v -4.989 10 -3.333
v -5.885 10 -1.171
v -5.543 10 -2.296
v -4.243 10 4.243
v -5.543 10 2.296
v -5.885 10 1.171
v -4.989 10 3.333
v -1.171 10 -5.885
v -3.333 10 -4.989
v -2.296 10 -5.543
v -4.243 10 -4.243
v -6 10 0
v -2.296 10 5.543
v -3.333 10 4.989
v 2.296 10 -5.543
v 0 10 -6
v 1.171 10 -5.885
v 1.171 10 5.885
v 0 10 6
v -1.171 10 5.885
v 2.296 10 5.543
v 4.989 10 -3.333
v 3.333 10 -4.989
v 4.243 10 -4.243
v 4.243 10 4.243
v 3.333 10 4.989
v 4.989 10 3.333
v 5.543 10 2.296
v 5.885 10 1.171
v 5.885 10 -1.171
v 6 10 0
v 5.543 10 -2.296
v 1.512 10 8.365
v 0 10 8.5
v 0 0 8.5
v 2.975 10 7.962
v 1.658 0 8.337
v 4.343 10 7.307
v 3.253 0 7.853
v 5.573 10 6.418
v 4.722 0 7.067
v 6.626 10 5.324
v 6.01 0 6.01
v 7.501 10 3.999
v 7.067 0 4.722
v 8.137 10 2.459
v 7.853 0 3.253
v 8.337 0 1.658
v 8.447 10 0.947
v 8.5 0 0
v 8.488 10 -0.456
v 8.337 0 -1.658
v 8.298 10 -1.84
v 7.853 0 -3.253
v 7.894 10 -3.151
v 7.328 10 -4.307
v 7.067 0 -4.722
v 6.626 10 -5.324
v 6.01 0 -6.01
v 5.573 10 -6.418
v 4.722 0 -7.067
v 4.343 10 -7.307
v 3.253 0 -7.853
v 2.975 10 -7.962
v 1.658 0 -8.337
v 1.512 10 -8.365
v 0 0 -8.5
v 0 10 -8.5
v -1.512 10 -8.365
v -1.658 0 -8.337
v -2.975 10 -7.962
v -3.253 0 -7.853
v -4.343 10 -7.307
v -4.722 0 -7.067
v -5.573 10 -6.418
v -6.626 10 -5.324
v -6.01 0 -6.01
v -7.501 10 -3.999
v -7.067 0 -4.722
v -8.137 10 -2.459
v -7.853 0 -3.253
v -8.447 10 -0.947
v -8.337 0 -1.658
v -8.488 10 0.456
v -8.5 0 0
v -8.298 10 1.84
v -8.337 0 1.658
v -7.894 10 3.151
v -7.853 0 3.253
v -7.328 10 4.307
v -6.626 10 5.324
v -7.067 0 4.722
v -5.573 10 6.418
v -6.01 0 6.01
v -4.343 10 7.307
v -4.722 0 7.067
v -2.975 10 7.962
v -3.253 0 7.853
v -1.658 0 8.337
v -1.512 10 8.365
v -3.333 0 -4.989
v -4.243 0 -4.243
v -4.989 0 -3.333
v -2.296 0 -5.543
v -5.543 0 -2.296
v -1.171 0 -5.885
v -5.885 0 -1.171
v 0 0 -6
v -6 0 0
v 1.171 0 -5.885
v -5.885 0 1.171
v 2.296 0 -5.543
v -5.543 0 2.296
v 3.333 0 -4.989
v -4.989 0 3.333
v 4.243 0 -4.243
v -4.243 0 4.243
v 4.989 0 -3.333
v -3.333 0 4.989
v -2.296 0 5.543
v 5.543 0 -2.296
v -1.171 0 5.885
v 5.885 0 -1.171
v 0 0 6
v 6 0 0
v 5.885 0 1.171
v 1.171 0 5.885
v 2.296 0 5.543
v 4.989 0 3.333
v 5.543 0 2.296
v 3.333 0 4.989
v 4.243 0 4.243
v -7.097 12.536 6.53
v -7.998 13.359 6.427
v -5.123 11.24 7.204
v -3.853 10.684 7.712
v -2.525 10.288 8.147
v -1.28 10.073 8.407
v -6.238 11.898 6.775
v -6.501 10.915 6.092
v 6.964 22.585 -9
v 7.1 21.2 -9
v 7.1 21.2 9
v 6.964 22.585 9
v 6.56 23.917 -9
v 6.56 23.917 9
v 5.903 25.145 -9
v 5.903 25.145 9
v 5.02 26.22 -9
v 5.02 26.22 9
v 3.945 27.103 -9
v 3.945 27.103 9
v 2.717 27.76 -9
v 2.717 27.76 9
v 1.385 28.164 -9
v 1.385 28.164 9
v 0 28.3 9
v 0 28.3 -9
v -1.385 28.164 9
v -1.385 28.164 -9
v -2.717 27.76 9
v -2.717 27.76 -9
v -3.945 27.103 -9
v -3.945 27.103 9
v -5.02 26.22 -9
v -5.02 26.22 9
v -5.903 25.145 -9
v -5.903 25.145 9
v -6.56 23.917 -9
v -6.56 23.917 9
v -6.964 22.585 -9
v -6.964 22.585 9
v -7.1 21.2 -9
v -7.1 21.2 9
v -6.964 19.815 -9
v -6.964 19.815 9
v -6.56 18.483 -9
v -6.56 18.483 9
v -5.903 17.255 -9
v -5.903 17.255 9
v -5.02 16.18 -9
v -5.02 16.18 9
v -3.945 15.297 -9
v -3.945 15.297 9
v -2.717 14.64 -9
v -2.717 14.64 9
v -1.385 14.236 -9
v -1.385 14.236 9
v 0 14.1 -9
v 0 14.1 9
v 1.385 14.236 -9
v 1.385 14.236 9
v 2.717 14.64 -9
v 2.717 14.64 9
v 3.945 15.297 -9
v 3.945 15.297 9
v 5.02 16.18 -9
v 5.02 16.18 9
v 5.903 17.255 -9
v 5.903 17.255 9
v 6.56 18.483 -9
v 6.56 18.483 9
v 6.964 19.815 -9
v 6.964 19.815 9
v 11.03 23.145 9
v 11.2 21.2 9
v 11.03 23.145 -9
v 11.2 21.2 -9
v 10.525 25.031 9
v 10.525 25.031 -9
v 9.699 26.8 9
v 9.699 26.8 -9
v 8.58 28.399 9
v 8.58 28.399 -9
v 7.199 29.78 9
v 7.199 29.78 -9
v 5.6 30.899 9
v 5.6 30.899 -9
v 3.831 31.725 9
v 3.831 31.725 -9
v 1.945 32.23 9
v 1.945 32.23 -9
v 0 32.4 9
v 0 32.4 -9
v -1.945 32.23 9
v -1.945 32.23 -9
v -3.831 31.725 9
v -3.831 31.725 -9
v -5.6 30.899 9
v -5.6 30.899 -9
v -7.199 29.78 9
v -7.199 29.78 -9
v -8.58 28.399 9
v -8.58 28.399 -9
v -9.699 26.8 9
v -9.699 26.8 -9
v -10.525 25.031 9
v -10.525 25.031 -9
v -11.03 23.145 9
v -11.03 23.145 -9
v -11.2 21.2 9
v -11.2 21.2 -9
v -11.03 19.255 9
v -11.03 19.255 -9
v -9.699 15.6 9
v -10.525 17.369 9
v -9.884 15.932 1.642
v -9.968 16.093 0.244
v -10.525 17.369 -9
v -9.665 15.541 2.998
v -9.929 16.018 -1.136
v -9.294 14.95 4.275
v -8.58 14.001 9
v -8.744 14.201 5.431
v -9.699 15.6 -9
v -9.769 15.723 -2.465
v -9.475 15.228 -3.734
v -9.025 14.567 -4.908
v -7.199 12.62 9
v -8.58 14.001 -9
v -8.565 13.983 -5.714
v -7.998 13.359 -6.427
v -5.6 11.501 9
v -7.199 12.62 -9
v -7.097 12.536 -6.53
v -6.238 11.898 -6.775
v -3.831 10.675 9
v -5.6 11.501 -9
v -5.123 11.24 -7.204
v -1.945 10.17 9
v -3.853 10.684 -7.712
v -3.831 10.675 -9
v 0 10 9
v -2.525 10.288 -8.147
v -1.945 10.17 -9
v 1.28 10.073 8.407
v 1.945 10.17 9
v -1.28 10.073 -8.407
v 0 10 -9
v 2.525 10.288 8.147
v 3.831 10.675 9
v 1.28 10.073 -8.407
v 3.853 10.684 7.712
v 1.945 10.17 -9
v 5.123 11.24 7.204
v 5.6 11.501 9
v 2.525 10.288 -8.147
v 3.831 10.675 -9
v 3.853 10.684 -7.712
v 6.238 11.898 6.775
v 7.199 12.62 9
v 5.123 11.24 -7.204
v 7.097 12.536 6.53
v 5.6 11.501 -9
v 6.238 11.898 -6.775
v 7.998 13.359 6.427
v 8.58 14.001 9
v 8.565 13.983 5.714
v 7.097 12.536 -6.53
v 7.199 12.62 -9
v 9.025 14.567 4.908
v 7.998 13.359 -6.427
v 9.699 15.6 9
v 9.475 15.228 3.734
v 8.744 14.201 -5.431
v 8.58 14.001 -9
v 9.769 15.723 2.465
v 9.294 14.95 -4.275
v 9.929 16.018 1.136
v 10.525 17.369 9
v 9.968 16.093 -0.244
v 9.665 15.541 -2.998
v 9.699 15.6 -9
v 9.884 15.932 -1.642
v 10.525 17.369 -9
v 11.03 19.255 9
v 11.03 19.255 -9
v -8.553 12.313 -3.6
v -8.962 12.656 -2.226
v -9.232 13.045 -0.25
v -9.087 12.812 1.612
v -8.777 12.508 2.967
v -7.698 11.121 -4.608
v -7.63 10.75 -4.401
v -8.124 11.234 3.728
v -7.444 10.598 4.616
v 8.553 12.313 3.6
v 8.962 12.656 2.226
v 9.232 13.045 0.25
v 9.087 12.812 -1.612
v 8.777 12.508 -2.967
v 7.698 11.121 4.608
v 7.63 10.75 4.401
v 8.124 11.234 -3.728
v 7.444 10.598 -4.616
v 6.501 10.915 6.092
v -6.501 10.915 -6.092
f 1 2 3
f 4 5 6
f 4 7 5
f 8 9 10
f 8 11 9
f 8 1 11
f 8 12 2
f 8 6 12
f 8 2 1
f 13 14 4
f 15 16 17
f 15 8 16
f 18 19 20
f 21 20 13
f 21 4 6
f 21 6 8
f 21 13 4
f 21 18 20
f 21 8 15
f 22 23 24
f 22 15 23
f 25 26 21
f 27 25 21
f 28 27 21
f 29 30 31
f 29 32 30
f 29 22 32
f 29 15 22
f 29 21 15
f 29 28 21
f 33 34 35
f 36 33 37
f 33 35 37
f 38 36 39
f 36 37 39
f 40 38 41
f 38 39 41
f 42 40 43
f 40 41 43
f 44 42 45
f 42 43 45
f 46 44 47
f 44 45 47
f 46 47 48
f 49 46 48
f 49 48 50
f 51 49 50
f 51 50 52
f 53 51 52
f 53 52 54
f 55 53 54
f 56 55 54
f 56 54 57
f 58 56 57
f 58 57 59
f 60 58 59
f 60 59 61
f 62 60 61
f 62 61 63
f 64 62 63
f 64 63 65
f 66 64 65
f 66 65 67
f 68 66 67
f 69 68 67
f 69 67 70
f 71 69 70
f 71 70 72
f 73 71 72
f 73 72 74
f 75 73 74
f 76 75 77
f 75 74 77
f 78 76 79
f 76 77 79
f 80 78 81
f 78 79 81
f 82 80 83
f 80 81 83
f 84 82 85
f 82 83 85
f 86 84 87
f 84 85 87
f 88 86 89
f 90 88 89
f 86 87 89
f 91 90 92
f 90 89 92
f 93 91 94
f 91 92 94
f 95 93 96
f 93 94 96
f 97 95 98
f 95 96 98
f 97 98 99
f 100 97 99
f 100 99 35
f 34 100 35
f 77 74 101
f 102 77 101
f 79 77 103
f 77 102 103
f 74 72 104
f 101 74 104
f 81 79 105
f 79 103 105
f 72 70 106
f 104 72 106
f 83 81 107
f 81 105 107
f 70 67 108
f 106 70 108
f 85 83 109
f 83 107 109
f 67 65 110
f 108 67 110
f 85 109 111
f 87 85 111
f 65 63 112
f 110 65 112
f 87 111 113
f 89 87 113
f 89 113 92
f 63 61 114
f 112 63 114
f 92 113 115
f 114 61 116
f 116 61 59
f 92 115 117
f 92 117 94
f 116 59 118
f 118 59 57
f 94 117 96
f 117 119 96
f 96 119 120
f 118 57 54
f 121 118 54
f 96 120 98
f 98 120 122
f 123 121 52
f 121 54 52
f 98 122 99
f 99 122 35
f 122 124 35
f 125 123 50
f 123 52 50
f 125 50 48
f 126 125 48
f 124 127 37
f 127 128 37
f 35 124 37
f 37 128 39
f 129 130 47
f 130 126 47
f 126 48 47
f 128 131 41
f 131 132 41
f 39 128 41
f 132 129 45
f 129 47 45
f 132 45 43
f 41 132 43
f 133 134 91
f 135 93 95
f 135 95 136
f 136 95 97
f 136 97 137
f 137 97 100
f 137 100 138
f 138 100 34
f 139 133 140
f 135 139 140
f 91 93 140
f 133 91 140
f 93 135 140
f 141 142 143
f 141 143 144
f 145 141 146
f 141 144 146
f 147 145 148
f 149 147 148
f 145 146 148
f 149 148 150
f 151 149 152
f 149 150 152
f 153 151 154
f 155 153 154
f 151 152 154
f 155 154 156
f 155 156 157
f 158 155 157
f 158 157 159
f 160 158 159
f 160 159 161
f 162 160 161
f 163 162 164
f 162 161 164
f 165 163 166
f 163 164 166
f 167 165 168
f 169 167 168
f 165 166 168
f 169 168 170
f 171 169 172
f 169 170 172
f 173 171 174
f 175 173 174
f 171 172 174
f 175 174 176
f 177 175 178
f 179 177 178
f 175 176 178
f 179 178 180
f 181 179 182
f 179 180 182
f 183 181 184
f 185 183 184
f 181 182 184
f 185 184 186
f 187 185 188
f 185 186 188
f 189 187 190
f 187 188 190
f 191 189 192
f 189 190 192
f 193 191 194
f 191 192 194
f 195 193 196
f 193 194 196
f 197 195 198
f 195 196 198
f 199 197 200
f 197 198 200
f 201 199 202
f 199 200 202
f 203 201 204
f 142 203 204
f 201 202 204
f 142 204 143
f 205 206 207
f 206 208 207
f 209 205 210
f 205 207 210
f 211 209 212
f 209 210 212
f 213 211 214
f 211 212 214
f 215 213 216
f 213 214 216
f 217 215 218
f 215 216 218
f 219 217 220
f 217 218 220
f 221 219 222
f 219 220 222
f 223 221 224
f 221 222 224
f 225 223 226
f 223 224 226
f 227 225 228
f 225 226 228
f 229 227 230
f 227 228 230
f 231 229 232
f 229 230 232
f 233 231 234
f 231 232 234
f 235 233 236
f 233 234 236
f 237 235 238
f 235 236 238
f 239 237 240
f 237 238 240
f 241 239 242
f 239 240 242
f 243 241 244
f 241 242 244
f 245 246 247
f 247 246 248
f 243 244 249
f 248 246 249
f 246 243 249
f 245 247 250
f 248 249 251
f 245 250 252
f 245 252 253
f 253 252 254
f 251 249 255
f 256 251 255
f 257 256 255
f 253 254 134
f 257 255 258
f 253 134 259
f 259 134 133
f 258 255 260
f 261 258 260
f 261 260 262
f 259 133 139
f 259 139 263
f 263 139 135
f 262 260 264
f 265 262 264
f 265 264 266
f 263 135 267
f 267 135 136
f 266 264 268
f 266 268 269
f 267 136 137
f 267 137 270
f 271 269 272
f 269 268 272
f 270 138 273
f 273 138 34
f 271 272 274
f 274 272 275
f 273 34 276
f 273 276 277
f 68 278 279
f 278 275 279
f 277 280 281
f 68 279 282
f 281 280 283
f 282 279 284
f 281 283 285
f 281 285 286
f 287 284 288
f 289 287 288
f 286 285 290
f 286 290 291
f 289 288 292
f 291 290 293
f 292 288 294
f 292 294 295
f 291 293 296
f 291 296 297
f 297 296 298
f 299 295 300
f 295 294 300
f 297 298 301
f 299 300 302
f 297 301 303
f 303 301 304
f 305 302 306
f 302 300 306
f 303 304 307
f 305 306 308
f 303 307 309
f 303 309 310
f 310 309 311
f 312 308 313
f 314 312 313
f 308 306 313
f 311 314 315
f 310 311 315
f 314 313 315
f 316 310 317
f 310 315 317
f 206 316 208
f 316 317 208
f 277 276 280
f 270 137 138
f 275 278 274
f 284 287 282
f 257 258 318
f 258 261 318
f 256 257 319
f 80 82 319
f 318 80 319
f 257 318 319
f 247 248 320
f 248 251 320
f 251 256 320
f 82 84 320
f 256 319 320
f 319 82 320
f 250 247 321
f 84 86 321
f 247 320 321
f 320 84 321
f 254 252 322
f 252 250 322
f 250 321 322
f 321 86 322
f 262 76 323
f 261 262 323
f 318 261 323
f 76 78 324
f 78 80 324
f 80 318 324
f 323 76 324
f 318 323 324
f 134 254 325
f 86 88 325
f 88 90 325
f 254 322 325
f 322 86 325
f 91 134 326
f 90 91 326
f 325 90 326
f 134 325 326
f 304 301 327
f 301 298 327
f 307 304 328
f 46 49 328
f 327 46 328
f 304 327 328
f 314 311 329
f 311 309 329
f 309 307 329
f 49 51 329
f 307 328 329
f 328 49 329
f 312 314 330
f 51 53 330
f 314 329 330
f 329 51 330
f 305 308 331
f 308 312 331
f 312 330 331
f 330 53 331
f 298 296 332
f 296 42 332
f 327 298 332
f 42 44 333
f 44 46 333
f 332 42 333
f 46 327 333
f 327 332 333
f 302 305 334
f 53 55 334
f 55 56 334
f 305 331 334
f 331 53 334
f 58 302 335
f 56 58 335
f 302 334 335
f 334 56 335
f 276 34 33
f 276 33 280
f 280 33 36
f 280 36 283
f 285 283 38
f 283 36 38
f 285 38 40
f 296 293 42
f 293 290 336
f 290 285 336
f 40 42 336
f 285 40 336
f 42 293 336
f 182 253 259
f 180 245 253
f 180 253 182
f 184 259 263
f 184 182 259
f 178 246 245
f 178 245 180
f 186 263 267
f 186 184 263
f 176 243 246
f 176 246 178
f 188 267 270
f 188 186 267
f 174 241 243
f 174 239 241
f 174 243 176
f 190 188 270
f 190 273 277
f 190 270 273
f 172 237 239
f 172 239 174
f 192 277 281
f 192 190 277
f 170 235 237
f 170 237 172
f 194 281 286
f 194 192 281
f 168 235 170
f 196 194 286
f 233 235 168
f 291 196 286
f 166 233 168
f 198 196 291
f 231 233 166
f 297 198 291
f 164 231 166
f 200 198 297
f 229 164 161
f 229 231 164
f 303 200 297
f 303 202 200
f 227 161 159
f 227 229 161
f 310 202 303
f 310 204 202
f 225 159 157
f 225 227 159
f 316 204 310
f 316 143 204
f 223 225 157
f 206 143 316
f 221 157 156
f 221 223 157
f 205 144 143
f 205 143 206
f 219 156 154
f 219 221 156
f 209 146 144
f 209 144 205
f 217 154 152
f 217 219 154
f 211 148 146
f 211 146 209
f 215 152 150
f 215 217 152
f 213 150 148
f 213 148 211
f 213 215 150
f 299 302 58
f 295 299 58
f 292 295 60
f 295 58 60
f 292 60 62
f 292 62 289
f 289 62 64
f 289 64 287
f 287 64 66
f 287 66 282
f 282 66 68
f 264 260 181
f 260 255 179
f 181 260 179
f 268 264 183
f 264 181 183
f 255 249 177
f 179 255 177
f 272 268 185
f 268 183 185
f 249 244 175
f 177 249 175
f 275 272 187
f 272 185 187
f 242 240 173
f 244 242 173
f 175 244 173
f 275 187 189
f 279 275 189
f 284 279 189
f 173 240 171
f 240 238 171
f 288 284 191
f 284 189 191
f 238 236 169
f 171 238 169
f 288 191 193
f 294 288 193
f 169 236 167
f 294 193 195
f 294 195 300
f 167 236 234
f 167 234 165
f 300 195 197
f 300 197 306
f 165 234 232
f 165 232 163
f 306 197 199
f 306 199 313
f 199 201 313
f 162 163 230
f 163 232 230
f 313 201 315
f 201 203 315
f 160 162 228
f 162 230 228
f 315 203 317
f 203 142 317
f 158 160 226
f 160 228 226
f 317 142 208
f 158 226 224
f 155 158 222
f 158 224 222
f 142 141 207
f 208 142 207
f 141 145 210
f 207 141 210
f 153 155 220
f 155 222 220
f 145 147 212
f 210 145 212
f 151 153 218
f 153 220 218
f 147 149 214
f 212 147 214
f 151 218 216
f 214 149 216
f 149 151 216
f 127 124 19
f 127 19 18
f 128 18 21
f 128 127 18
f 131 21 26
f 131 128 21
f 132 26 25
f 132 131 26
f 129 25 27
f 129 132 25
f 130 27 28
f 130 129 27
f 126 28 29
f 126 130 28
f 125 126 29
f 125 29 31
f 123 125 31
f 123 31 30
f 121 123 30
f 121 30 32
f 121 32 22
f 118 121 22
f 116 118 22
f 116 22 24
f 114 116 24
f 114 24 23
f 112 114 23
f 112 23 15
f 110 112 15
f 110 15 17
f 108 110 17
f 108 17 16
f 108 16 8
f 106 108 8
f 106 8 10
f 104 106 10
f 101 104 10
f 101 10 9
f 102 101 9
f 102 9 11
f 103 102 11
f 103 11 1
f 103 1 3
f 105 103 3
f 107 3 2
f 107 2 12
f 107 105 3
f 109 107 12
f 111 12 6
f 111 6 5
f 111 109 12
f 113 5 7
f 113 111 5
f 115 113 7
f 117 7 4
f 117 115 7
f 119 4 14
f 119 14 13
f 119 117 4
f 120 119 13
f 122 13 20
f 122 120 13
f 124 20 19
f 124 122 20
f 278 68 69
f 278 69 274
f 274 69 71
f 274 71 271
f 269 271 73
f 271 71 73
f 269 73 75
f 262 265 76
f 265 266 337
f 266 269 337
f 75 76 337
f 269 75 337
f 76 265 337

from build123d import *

# Parameters (mm, degrees)
SKETCH1_R                = 8.5
SKETCH1_R_2              = 6
BOSS_EXTRUDE1_DEPTH      = 10
BOSS_EXTRUDE2_DEPTH      = 9
BOSS_EXTRUDE2_DEPTH_BACK = 9
SKETCH3_R                = 11.2
SKETCH8_R                = 7.1
CUT_EXTRUDE1_DEPTH       = 18


with BuildPart() as part:
    # Sketch1 → Boss-Extrude1 (new body)
    with BuildSketch(Plane(origin=(0, 0, 0), x_dir=(1, 0, 0), z_dir=(0, 1, 0))):
        with Locations(Location((0, 0, 0), (0, 0, 270))):
            Circle(SKETCH1_R)
        with Locations(Location((0, 0, 0), (0, 0, 270))):
            Circle(SKETCH1_R_2, mode=Mode.SUBTRACT)
    extrude(amount=BOSS_EXTRUDE1_DEPTH)



with BuildPart() as body_2:
    # Sketch3 → Boss-Extrude2 (new, two sides: drawn at the far end of the back side and taken through both)
    with BuildSketch(Plane.XY.offset(-BOSS_EXTRUDE2_DEPTH_BACK)):
        with Locations((0, 21.2)):
            Circle(SKETCH3_R)
    extrude(amount=BOSS_EXTRUDE2_DEPTH + BOSS_EXTRUDE2_DEPTH_BACK)


with BuildPart() as part_1:
    add(part.part)

    add(body_2.part)  # Loft1 merges body 2
    # Sketch7 → Loft1 section 0
    with BuildSketch(Plane(origin=(0, 21.2, 0), x_dir=(1, 0, 0), z_dir=(0, 1, 0))):
        with BuildLine():
            Line((-11.2, -9), (11.2, -9))
            Line((11.2, -9), (11.2, 9))
            Line((11.2, 9), (-11.2, 9))
            Line((-11.2, 9), (-11.2, -9))
        make_face()
    # Sketch6 for Loft1 → Loft1 section 1
    with BuildSketch(Plane(origin=(0, 10, 0), x_dir=(1, 0, 0), z_dir=(0, 1, 0))):
        with BuildLine():
            # circular arc as an exact rational Bezier (weights 1, cos(half-angle), 1)
            Bezier((-6.625825946, -5.324324421), (0, -13.569796708), (6.625825946, -5.324324421), weights=[1, 0.626391108, 1])
            Bezier((6.625825946, -5.324324421), (10.904300926, 0), (6.625825946, 5.324324421), weights=[1, 0.779508935, 1])
            Bezier((6.625825946, 5.324324421), (0, 13.569796708), (-6.625825946, 5.324324421), weights=[1, 0.626391108, 1])
            Bezier((-6.625825946, 5.324324421), (-10.904300926, 0), (-6.625825946, -5.324324421), weights=[1, 0.779508935, 1])
        make_face()
    loft()

    # Sketch8 → Cut-Extrude1 (cut)
    with BuildSketch(Plane.XY.offset(9)):
        with Locations((0, 21.2)):
            Circle(SKETCH8_R)
    extrude(amount=-CUT_EXTRUDE1_DEPTH, mode=Mode.SUBTRACT)


solid = part_1.part
